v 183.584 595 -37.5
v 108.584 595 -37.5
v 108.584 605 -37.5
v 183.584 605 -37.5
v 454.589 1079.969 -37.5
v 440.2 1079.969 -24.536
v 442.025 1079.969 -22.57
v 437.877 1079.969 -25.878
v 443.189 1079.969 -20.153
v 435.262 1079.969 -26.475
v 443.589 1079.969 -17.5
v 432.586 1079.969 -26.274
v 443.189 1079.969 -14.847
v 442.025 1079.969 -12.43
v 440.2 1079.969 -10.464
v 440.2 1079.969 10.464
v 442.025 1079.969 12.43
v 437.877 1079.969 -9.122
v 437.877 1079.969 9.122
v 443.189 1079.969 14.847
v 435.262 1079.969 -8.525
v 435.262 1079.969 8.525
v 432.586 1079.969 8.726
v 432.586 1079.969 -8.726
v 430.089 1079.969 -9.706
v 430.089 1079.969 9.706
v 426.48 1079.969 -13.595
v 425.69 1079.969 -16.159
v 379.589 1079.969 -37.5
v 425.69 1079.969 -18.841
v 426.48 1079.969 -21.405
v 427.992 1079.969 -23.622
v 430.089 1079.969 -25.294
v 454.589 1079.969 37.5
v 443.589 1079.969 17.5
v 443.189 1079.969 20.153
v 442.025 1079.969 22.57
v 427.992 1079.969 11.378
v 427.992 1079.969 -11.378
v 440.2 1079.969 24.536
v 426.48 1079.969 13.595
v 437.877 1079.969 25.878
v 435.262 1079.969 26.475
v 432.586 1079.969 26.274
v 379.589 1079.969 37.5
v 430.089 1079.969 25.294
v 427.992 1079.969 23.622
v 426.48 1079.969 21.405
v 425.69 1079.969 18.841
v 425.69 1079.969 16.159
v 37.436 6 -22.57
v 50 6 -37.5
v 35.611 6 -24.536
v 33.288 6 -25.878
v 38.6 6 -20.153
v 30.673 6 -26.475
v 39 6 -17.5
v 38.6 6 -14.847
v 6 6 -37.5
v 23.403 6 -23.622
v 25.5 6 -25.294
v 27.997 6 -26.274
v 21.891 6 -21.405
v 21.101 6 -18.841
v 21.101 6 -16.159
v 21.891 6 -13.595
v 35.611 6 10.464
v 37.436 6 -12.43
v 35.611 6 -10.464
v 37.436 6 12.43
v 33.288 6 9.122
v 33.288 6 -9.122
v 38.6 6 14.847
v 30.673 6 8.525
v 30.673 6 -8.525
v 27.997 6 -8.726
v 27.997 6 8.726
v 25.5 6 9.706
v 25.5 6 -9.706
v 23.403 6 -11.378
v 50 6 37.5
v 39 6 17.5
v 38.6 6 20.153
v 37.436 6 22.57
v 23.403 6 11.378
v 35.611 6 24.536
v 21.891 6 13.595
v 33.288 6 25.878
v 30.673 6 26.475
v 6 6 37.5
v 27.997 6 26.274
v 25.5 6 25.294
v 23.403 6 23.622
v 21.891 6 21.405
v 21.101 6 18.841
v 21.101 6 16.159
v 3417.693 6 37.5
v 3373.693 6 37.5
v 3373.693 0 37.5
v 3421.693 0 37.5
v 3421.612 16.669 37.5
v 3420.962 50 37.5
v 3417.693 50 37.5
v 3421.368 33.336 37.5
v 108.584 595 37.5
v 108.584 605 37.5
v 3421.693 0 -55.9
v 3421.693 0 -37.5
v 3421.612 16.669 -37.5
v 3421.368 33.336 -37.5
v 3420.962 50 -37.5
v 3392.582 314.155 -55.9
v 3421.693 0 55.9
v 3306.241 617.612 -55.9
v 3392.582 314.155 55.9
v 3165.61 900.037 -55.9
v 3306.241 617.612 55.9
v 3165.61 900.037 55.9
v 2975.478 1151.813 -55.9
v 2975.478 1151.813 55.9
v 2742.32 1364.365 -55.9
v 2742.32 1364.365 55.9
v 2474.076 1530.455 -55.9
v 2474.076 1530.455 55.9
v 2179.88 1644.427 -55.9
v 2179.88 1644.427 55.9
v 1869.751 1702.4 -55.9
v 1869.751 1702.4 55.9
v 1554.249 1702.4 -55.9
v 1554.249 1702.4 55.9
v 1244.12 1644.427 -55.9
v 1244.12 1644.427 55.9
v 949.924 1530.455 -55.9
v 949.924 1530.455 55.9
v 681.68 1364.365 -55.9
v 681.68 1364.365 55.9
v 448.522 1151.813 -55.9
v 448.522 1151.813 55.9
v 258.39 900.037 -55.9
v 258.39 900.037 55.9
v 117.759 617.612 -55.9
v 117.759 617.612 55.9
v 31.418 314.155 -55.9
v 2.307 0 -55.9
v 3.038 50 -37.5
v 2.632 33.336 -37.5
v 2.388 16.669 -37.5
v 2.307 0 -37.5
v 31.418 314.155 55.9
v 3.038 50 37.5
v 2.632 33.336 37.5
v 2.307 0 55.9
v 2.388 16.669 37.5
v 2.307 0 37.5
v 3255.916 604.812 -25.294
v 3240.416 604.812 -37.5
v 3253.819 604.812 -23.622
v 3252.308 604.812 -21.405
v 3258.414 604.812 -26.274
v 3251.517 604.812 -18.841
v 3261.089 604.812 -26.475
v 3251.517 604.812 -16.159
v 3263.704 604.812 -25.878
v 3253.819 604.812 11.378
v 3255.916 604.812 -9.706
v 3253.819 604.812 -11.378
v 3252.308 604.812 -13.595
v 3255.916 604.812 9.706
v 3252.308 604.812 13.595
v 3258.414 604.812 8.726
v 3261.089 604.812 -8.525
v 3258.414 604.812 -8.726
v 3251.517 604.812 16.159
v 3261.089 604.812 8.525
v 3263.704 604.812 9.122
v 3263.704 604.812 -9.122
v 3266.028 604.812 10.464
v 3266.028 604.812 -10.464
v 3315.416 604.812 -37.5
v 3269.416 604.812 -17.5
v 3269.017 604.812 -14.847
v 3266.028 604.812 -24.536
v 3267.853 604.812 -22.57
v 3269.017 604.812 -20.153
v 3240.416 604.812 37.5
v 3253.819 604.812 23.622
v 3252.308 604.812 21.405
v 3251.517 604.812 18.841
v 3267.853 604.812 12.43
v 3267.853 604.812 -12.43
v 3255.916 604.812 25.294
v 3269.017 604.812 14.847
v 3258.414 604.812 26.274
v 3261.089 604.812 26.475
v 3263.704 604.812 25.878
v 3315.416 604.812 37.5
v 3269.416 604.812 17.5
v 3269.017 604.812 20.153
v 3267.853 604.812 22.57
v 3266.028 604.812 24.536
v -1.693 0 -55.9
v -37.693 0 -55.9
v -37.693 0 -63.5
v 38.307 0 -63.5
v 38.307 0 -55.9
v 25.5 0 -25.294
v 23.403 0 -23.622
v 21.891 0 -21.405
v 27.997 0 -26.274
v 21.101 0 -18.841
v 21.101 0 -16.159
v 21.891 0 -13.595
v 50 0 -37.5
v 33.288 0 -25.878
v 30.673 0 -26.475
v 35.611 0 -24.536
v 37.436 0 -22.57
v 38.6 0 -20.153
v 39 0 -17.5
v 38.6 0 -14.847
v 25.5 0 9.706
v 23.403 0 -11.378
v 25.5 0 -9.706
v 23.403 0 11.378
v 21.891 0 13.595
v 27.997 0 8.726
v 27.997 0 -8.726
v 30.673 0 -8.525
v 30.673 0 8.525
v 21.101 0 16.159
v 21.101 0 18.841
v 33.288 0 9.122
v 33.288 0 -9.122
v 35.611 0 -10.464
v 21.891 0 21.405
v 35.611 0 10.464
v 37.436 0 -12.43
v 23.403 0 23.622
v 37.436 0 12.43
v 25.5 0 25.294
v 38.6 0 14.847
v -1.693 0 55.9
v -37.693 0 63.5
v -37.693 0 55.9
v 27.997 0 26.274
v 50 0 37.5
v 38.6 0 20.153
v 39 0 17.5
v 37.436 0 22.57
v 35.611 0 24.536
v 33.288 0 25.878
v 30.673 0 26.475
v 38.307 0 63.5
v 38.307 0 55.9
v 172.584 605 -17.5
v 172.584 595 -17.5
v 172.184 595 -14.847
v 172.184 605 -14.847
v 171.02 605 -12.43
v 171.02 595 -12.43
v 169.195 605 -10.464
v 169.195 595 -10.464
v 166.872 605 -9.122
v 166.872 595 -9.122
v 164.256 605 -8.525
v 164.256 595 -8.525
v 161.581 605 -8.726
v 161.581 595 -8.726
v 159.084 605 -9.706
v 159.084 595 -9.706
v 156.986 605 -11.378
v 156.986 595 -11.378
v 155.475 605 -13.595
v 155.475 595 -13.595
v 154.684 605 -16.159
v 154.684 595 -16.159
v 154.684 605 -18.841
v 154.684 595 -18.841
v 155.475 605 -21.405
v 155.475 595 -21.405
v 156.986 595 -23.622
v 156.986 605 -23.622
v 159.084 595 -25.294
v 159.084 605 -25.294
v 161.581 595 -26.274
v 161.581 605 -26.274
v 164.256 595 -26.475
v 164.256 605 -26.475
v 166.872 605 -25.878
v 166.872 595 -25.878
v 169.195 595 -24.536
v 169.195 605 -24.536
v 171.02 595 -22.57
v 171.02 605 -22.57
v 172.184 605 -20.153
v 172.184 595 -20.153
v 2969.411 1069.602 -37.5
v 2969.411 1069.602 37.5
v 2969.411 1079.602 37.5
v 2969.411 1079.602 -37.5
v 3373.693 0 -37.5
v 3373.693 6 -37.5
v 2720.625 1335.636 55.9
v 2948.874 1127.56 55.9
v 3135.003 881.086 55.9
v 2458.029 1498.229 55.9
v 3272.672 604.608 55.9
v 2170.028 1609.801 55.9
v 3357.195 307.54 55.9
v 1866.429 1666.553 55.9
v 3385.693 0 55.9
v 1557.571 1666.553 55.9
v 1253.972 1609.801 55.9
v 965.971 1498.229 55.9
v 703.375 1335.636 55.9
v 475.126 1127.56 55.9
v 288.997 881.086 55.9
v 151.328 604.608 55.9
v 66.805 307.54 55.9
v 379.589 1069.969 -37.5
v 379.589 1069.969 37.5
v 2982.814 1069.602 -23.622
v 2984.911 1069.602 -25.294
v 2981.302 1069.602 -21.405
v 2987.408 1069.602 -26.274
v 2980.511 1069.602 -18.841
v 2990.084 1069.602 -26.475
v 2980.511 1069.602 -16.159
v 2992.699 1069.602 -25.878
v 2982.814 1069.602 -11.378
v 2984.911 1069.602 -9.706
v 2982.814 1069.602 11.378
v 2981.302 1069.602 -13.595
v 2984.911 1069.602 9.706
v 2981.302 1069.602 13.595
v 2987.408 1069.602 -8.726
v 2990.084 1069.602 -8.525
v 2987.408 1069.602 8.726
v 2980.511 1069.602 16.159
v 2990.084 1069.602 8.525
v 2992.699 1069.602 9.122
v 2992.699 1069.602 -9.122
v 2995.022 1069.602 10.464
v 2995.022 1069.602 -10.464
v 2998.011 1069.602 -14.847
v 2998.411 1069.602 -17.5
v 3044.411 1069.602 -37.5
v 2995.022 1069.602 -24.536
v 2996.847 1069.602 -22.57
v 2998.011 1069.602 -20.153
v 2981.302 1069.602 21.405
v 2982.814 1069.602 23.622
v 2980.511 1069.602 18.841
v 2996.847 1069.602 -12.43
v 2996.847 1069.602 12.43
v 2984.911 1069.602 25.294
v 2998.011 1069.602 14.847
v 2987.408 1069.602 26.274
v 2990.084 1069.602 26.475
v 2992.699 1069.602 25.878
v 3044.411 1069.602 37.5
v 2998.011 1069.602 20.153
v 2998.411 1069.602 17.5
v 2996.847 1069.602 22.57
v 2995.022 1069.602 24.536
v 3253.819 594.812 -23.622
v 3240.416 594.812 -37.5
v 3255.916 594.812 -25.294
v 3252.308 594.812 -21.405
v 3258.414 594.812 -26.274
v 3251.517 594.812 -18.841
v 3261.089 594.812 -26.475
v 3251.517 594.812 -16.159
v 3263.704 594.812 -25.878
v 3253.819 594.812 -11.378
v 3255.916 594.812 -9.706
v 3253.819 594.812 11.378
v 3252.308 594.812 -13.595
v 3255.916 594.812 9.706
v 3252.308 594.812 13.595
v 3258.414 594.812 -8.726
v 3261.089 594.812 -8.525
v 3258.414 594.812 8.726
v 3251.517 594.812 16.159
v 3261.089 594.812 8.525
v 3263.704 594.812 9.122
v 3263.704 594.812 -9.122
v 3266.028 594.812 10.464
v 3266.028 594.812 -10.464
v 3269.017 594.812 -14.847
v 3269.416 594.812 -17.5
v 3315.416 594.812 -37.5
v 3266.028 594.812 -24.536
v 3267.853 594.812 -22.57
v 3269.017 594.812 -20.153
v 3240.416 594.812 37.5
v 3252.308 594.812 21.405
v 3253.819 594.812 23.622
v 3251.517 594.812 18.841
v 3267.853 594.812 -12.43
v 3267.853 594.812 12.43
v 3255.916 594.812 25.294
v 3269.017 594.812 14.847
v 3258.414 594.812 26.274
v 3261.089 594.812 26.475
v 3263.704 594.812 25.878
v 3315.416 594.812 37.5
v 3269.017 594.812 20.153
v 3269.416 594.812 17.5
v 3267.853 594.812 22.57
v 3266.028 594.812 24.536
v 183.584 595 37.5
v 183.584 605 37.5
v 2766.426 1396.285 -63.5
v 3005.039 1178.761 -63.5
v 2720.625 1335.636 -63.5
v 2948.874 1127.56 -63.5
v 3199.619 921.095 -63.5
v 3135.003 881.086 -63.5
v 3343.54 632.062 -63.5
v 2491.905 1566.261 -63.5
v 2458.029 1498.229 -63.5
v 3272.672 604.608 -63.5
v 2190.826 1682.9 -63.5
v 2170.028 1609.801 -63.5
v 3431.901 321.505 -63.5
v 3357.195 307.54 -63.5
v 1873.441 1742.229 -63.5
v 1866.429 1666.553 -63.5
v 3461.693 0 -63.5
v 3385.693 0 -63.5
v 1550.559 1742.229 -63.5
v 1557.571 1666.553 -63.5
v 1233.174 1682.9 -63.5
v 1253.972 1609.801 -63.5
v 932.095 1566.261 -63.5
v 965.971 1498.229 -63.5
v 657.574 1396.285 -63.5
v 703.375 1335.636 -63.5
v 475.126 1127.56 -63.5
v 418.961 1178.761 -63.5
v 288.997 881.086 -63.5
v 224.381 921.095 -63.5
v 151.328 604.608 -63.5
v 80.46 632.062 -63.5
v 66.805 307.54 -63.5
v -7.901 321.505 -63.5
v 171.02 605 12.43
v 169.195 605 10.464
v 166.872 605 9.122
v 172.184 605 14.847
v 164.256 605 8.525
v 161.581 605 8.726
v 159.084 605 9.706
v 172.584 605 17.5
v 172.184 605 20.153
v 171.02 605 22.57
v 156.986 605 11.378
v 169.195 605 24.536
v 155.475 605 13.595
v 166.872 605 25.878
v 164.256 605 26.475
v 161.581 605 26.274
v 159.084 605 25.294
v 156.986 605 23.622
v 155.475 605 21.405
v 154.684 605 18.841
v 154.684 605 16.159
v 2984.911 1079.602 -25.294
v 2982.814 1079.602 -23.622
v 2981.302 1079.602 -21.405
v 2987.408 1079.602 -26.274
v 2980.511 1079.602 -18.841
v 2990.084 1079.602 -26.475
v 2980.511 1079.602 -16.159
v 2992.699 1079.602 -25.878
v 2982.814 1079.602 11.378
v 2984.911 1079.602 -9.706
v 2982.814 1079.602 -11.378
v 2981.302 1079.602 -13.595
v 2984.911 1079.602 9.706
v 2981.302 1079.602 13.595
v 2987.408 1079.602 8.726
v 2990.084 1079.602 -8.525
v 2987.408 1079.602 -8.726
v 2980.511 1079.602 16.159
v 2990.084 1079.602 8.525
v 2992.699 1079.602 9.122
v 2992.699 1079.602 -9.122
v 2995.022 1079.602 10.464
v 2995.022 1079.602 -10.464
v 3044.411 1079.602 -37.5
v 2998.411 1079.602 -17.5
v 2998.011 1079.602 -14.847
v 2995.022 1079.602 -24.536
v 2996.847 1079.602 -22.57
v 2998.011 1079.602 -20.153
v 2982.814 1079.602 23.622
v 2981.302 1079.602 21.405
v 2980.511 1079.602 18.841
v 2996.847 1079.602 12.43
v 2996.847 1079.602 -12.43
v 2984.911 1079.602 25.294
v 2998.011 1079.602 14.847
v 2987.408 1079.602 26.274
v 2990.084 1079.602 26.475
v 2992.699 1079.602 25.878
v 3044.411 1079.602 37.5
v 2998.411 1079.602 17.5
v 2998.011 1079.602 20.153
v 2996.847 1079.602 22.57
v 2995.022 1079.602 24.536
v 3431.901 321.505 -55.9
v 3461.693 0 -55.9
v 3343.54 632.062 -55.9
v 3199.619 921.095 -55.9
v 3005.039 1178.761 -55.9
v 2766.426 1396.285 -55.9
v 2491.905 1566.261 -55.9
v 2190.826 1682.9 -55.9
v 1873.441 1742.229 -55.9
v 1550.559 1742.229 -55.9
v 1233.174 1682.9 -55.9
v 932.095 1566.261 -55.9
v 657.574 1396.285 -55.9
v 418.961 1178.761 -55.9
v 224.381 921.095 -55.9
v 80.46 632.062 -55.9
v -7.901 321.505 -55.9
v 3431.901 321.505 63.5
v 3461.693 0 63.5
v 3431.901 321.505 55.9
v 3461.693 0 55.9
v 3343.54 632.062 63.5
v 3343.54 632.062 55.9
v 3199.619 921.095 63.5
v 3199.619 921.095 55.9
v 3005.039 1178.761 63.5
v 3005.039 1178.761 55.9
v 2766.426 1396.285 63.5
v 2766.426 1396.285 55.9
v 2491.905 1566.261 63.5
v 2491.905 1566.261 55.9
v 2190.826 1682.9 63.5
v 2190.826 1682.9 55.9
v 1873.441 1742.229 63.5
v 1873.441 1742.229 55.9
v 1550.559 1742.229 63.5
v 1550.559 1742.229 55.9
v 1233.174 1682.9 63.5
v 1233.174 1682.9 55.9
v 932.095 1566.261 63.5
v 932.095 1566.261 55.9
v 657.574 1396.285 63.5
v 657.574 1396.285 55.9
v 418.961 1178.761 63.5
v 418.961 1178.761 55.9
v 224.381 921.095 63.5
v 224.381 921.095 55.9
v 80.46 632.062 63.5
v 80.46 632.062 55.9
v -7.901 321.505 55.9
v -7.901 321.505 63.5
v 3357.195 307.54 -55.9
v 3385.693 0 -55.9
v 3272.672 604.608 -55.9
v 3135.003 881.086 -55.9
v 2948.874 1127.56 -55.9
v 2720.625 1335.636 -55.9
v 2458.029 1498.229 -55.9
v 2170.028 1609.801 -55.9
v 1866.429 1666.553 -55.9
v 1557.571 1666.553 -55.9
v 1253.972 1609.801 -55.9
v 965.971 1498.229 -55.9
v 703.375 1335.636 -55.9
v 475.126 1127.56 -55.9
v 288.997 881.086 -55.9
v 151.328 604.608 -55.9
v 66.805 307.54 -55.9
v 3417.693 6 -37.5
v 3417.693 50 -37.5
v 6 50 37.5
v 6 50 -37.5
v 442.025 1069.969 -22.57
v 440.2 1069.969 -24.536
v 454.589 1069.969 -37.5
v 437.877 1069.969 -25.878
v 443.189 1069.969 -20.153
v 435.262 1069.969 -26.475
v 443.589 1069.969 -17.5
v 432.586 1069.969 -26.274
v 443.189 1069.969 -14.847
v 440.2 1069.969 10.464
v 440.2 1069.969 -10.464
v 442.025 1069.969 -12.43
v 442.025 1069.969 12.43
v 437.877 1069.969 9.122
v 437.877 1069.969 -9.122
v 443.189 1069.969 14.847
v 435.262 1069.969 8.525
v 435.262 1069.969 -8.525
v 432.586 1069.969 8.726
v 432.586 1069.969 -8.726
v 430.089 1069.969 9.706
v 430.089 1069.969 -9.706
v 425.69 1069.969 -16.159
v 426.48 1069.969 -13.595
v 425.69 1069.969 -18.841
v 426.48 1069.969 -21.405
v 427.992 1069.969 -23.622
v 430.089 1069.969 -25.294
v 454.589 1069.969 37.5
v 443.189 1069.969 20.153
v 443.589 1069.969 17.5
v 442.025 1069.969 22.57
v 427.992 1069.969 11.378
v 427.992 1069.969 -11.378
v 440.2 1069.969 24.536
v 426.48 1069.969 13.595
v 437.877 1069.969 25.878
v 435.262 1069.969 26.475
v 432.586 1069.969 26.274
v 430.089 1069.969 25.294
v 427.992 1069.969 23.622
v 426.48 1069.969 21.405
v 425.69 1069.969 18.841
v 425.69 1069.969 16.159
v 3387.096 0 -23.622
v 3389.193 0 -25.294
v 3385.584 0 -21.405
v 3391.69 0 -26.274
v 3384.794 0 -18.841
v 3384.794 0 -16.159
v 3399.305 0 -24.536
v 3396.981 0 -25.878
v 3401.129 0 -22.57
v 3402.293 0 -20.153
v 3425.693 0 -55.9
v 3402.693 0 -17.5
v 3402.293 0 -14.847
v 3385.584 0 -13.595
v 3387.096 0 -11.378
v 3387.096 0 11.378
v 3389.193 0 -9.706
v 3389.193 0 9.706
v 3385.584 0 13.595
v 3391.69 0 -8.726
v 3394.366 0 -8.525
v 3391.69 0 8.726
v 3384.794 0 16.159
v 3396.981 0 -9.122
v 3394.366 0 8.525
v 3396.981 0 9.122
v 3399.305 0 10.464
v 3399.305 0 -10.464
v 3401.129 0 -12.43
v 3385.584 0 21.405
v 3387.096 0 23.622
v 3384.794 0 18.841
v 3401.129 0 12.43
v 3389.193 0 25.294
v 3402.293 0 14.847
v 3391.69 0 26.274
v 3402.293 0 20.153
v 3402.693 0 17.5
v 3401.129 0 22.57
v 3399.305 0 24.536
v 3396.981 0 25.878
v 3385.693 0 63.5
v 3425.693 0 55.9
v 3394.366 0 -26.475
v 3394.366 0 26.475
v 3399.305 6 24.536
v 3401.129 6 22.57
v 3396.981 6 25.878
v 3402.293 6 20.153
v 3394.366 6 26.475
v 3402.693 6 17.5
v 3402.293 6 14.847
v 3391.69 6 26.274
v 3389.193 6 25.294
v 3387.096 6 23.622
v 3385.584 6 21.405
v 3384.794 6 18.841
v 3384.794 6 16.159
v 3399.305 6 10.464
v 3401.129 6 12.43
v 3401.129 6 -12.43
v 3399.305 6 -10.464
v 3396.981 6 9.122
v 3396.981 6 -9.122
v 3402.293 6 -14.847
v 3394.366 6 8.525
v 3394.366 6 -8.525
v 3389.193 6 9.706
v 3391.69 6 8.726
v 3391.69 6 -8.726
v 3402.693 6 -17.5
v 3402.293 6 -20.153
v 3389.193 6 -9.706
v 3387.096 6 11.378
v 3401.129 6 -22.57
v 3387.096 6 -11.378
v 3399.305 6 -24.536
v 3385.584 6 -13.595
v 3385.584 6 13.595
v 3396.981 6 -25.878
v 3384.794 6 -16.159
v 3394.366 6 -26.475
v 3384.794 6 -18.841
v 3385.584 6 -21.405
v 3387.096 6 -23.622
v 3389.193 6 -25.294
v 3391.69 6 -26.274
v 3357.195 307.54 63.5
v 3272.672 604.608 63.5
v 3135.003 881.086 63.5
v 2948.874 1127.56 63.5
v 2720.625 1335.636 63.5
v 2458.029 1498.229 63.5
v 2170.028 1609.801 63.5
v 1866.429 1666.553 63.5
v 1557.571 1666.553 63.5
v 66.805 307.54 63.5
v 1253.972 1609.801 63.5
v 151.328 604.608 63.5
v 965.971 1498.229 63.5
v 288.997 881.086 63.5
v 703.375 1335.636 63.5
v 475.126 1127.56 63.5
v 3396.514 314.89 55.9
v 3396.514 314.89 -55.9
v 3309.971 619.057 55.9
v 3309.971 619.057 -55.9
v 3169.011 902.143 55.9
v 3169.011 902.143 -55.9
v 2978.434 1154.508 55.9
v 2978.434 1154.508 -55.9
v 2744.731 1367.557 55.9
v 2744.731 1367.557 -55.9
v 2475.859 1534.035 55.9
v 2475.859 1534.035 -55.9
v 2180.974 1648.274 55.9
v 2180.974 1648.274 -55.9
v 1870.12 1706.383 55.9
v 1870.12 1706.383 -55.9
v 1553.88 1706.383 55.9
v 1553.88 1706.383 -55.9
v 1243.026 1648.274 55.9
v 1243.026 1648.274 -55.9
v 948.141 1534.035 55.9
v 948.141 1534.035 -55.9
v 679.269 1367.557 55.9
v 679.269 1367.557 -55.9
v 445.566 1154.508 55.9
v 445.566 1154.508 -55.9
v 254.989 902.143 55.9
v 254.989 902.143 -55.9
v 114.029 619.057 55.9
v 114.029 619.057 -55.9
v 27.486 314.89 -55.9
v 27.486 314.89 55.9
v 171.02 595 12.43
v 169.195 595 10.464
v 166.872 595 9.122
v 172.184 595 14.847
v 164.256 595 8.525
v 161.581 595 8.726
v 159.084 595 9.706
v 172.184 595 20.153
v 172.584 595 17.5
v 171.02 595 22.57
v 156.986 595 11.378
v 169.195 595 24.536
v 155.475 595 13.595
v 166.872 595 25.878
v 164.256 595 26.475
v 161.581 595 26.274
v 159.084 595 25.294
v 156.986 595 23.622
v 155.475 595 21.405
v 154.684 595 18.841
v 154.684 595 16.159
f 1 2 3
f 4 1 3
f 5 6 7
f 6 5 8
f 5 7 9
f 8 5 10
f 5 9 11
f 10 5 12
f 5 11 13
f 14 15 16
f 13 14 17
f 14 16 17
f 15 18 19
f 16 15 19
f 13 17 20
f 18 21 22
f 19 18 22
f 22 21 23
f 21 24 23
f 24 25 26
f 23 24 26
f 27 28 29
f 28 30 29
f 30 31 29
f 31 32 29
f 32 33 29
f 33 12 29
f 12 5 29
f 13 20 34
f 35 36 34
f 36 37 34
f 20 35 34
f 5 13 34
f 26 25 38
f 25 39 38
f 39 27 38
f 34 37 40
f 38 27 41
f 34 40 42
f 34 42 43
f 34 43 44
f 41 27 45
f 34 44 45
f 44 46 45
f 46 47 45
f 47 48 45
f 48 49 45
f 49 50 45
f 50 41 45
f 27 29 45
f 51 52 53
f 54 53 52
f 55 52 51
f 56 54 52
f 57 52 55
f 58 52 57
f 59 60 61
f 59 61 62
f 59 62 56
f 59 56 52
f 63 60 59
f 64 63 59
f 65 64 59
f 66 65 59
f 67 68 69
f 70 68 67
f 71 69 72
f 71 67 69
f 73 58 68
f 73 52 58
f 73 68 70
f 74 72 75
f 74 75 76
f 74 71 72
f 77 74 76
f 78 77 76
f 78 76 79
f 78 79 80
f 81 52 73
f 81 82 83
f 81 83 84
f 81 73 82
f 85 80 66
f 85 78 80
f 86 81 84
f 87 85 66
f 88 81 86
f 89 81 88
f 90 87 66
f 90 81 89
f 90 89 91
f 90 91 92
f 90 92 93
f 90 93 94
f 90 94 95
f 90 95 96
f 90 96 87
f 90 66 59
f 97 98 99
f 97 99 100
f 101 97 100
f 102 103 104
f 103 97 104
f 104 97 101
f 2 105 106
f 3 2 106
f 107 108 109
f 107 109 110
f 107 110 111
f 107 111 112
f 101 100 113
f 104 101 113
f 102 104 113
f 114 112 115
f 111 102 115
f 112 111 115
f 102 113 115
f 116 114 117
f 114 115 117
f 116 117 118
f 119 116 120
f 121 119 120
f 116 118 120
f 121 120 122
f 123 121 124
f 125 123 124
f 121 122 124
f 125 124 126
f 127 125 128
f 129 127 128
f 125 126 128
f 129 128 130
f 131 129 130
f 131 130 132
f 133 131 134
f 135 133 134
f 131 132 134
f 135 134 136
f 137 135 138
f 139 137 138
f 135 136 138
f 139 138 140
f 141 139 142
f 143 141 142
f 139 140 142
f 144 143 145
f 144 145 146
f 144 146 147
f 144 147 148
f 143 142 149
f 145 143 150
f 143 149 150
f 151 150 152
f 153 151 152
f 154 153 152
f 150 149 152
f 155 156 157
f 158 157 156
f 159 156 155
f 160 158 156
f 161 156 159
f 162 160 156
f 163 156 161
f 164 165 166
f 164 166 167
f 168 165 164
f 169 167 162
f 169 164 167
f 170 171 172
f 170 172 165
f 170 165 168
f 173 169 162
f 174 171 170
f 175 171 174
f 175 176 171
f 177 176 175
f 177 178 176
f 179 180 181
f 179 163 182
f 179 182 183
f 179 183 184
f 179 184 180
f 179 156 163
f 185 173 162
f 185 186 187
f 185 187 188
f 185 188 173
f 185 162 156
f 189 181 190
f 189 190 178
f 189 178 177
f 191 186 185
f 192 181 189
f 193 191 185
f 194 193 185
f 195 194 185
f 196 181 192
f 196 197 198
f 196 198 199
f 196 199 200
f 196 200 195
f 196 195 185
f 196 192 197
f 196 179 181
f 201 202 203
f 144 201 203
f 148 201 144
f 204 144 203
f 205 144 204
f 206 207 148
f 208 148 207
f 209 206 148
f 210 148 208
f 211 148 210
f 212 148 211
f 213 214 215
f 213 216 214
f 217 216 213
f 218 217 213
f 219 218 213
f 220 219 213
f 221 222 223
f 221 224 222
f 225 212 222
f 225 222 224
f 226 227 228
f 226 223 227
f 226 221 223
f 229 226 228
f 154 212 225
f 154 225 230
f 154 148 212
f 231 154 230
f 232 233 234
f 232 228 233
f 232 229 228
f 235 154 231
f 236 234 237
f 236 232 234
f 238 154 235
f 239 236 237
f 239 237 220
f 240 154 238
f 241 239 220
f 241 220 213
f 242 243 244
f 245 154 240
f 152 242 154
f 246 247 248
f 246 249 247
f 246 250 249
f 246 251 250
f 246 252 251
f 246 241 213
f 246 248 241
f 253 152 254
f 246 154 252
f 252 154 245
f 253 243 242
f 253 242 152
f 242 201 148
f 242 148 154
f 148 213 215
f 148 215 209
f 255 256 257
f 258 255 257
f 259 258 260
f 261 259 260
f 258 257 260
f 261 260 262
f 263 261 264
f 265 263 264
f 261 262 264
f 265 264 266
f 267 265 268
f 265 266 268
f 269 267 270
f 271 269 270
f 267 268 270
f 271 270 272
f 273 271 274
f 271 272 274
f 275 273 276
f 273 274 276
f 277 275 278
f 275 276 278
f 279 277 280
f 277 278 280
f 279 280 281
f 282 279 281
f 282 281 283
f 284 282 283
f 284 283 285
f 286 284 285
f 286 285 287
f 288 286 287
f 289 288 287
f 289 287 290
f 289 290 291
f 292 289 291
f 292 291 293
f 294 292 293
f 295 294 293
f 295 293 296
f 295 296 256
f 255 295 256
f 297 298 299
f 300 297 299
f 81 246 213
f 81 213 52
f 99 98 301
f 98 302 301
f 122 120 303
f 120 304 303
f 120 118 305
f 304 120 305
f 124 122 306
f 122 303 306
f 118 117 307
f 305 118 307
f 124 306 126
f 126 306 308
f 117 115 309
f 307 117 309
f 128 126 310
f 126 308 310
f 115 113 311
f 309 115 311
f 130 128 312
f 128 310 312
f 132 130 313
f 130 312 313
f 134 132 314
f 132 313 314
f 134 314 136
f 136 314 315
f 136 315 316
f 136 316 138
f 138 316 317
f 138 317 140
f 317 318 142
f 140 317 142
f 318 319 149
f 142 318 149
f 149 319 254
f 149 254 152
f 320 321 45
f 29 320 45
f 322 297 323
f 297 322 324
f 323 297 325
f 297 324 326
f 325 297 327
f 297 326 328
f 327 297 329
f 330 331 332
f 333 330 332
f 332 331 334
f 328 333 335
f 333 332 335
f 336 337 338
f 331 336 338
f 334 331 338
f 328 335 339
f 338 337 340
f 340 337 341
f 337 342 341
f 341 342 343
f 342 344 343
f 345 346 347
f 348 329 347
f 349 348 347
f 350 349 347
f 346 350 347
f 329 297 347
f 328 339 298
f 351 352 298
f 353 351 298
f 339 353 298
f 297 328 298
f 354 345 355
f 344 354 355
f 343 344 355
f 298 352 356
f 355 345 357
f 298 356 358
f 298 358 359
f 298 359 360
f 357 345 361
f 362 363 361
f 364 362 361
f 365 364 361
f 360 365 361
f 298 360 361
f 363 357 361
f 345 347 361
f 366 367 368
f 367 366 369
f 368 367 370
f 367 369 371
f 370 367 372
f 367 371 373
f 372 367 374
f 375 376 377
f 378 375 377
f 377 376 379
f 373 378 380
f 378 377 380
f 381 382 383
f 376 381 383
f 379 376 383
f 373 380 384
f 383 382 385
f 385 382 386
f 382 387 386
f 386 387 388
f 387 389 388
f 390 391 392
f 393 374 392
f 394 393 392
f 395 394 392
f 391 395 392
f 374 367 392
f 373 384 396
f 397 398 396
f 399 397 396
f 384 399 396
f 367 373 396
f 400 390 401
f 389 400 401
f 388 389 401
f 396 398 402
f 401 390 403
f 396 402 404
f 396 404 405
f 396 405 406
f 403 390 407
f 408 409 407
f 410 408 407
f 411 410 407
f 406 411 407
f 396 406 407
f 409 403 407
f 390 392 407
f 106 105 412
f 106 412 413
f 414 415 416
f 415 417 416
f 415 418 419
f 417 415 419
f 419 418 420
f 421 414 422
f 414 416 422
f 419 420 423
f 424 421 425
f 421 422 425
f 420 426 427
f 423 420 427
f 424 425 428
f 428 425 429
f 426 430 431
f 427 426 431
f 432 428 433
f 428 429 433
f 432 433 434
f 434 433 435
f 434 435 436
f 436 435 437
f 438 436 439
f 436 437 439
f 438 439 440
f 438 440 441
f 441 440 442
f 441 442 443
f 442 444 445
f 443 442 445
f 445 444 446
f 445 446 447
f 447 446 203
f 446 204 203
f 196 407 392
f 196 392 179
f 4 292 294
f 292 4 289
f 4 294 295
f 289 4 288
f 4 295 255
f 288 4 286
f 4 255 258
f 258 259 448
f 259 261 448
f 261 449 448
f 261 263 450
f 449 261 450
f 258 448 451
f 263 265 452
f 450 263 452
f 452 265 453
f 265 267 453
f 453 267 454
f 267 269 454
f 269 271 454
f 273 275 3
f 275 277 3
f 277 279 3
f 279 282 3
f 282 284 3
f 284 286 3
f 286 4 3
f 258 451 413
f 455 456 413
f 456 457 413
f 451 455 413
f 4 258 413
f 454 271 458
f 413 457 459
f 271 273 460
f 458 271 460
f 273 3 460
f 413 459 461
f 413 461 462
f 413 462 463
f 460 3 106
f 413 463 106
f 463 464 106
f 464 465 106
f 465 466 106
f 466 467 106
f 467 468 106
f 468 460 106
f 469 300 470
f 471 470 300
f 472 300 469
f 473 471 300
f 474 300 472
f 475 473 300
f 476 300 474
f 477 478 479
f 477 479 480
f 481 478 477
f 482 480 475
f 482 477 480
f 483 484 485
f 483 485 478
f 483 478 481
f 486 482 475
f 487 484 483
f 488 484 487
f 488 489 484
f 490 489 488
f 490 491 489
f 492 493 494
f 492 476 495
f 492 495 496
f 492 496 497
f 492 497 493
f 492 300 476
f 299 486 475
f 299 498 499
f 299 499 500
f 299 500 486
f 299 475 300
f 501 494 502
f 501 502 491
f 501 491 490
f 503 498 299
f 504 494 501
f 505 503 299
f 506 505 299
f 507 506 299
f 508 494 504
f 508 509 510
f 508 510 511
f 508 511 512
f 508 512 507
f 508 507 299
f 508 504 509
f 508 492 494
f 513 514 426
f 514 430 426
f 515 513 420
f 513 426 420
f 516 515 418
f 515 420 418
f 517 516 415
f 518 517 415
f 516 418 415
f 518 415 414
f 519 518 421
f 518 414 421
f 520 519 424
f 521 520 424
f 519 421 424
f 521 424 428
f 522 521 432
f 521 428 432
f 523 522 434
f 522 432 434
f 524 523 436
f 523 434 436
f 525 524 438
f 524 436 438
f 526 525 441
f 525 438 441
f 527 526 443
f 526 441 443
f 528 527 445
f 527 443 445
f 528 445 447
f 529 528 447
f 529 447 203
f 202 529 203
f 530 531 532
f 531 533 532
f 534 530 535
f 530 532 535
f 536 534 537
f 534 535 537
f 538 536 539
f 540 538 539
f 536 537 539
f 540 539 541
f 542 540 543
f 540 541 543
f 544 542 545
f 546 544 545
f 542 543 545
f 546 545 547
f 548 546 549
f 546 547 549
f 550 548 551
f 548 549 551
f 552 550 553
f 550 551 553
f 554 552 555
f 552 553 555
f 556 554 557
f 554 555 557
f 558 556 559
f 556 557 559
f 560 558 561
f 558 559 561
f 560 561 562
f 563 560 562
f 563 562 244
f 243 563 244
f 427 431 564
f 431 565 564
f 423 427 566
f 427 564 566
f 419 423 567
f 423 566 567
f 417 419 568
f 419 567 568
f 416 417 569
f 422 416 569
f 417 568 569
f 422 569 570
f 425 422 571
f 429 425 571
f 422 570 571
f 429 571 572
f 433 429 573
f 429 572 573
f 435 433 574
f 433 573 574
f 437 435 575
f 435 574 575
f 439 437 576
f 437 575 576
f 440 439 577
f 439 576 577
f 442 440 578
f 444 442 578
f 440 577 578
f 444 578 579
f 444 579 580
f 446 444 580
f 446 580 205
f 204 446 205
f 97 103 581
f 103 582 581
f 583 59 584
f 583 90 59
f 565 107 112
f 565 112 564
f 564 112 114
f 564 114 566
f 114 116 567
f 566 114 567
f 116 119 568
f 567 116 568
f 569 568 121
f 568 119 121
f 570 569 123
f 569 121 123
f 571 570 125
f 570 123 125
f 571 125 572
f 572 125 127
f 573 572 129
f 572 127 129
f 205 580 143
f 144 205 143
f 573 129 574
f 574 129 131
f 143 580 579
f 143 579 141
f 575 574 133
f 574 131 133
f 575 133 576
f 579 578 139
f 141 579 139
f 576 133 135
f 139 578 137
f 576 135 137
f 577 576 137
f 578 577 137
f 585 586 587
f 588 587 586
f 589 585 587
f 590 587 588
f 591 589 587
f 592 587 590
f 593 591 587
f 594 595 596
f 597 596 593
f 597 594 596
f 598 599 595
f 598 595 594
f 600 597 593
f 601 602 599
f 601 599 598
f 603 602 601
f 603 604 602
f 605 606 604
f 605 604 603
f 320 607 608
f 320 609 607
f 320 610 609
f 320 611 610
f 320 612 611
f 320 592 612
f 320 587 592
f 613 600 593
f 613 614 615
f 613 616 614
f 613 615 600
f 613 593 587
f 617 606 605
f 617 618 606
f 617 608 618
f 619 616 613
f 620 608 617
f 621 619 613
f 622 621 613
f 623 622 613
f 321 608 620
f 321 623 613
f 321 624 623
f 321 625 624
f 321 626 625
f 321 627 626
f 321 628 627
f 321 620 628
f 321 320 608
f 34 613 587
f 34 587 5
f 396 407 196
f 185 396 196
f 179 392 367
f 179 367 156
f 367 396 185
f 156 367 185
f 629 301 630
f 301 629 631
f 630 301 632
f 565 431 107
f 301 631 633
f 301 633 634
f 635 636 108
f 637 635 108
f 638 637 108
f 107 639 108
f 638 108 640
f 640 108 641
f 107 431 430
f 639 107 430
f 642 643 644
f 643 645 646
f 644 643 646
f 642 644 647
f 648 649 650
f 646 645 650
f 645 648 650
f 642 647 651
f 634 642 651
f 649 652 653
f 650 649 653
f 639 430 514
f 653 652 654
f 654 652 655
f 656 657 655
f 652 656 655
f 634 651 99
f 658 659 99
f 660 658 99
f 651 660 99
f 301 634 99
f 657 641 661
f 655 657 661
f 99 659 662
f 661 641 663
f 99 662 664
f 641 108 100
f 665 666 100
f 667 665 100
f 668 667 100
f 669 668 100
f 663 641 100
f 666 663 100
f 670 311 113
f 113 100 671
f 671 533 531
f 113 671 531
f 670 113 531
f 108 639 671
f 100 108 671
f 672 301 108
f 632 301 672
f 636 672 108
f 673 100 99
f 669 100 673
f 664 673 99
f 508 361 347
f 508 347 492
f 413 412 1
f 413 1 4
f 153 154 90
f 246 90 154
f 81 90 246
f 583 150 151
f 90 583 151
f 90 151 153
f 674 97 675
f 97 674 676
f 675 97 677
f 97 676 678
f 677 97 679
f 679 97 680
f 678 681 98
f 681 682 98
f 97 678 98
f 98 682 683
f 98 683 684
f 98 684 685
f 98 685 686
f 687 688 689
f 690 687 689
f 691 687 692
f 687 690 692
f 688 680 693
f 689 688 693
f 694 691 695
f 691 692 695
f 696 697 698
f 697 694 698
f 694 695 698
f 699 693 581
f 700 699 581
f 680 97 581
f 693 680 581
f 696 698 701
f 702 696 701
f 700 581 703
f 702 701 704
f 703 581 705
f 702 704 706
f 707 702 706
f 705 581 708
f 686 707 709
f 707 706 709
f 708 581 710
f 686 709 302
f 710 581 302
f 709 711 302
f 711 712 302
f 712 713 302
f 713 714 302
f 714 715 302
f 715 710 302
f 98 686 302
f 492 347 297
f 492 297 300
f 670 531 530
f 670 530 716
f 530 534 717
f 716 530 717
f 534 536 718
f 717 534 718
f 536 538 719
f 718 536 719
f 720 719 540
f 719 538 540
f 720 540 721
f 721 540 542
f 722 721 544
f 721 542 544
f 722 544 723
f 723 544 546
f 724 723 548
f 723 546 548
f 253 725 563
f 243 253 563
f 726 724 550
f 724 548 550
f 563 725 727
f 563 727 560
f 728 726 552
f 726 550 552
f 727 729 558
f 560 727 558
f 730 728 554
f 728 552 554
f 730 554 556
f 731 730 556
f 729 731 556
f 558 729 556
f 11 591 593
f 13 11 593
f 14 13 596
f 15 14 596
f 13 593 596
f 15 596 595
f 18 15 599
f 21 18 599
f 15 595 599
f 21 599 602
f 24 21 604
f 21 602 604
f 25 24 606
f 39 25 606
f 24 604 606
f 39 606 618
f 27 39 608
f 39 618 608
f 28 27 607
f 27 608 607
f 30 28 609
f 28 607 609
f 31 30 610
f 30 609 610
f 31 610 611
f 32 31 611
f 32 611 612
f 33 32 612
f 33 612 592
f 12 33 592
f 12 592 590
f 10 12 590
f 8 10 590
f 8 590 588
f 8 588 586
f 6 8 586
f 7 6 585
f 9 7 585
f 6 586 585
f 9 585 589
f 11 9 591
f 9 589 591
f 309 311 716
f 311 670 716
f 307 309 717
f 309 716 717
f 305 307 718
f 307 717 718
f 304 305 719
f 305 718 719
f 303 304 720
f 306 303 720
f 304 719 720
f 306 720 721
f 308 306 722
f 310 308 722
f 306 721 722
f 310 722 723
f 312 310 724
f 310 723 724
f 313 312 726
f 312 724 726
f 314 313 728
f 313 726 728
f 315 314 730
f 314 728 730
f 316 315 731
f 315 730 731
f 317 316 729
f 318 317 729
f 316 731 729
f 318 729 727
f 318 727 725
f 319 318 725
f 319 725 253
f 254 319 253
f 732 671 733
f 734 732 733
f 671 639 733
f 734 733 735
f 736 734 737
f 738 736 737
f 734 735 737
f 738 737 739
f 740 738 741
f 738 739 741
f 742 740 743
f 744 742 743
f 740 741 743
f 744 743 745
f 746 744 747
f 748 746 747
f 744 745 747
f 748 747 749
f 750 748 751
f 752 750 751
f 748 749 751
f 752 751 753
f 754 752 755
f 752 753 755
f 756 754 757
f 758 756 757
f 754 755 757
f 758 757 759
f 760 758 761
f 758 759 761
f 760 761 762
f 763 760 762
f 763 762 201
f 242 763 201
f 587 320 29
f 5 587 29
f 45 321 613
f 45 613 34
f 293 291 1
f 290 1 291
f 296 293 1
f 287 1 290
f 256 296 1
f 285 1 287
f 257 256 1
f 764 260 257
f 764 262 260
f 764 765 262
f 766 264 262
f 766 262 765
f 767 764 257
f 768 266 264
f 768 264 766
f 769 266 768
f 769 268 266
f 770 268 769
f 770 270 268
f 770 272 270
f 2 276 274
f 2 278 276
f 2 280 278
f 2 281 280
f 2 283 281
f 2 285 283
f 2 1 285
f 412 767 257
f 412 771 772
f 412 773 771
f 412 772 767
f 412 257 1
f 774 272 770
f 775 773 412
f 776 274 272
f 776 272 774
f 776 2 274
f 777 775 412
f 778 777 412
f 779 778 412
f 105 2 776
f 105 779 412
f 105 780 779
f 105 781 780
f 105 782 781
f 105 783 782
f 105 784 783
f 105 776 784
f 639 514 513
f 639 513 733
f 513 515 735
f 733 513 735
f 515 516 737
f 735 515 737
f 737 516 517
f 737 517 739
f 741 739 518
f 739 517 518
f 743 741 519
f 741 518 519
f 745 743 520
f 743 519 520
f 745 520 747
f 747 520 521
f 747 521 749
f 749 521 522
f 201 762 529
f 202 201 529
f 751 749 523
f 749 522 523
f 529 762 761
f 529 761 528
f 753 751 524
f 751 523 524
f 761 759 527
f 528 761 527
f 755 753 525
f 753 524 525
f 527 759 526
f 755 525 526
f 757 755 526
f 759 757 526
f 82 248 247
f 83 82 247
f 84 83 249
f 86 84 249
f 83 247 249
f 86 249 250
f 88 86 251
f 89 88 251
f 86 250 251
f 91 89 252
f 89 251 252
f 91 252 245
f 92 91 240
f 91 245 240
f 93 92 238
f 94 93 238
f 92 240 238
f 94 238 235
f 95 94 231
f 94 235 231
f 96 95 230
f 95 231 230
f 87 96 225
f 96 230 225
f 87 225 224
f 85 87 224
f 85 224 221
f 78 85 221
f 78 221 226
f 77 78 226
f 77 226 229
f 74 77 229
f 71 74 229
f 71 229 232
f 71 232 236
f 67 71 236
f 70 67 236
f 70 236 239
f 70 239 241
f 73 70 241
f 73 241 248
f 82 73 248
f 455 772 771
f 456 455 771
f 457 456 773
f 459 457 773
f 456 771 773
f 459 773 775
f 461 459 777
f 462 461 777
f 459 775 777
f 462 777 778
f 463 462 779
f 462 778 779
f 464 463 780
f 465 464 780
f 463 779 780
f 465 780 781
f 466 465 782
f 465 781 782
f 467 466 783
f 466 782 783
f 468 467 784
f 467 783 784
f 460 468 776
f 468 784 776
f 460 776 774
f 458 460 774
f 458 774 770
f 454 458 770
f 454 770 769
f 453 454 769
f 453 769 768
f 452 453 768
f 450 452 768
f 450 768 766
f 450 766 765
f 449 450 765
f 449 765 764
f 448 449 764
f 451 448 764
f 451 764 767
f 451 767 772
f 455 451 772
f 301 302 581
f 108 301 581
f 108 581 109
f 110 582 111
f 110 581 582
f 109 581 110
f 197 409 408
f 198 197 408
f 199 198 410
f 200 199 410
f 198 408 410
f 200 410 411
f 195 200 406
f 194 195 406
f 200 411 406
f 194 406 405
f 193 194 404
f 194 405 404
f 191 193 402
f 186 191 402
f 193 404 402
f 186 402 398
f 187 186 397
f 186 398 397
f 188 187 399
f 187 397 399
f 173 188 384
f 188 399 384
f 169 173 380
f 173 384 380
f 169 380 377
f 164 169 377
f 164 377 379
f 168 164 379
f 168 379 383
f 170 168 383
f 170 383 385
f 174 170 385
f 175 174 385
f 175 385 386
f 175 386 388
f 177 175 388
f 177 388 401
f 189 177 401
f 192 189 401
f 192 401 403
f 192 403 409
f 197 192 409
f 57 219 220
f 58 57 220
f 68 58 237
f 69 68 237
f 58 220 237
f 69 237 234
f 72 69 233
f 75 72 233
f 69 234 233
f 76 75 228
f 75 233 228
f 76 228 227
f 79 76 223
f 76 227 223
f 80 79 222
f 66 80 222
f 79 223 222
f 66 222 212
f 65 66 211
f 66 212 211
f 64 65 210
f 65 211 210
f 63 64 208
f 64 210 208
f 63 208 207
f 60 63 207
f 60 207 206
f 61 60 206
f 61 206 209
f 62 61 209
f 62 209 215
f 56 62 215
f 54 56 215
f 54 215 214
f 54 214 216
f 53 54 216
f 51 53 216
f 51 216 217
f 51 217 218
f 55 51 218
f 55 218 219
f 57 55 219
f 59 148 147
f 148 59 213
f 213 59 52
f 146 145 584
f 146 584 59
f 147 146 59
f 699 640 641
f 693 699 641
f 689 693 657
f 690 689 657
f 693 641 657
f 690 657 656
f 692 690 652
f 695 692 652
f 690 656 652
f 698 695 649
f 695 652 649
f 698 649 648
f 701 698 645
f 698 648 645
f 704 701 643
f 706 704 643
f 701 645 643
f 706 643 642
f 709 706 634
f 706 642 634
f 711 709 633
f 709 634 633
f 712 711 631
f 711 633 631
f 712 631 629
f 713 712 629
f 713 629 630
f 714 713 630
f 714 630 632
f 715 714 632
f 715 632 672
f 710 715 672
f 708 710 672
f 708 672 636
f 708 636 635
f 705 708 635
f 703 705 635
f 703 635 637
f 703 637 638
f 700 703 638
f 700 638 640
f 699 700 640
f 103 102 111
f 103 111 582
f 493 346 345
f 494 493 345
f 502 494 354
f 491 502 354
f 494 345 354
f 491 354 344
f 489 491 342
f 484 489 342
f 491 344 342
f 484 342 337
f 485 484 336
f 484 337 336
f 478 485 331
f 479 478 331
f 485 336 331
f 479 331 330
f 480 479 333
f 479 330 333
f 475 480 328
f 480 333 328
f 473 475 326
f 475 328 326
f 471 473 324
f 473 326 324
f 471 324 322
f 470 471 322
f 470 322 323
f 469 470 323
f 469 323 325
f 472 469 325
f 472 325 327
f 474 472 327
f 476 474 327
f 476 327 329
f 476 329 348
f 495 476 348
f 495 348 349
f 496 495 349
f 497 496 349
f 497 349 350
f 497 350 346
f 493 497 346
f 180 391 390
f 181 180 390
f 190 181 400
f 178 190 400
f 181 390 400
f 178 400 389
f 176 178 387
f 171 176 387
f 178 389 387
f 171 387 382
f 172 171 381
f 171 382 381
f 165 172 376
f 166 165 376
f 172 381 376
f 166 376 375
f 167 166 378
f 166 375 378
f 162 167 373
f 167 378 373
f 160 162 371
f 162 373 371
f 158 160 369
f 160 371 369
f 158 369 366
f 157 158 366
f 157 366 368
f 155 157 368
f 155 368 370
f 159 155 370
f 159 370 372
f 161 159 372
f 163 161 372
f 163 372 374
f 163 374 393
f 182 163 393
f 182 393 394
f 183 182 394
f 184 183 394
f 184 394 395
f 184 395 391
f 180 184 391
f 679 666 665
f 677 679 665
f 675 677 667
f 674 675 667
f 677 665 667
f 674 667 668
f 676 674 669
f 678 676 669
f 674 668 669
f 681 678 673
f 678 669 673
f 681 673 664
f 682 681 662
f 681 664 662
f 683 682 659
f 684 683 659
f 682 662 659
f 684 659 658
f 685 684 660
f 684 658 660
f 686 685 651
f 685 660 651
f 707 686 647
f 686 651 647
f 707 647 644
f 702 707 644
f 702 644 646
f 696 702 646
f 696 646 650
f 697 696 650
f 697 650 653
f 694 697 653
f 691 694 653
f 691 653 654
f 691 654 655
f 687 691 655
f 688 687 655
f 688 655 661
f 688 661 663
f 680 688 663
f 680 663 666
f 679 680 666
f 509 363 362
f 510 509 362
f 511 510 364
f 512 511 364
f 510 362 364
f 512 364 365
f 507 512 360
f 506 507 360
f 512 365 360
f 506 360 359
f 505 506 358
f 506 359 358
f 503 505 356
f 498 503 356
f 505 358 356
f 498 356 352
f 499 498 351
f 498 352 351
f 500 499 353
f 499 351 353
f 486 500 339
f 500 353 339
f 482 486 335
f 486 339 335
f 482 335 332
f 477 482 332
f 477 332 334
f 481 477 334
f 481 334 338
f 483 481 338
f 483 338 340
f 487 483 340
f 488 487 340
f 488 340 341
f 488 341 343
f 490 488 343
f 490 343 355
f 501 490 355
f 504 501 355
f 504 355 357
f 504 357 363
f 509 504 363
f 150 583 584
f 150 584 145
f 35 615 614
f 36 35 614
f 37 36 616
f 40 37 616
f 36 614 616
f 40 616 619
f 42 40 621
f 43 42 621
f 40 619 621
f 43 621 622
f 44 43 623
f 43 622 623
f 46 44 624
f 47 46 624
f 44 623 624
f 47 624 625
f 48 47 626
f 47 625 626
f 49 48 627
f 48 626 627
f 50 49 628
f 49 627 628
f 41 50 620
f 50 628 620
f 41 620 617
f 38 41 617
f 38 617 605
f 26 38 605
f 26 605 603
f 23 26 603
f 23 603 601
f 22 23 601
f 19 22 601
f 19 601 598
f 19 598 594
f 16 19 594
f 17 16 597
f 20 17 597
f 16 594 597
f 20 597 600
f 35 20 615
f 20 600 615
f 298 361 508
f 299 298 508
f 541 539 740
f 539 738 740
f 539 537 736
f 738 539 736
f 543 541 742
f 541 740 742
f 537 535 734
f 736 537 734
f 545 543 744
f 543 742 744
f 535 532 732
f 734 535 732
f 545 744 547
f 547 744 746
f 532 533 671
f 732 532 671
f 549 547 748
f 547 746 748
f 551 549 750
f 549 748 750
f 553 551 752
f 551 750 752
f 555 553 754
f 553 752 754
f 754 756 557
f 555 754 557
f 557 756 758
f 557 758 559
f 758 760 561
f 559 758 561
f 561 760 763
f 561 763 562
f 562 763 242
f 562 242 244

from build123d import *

# Parameters (mm, degrees)
F5_W      = 10
F5_H      = 75
F6_DEPTH  = 75
F9_W      = 10
F9_H      = 75
F10_DEPTH = 75
F11_W     = 10
F11_H     = 75
F12_DEPTH = 75
F13_W     = 10
F13_H     = 75
F14_DEPTH = 75
F15_R     = 9
F16_DEPTH = 10
F17_R     = 9
F18_DEPTH = 25
F19_R     = 9
F20_DEPTH = 25
F21_R     = 9
F22_DEPTH = 25
F24_DEPTH = 37.5
F25_R     = 9
F26_DEPTH = 25


with BuildPart() as f2:
    # F2: sweep along a path in F1
    with BuildLine(Plane.XY) as f2_path:
        ThreePointArc((3424, 0), (1712, 1712), (0, 0))
    # F0 (on Front) → F2 (sweep)
    with BuildSketch(Plane.XZ):
        Polygon((38.306882, 63.5), (-37.693118, 63.5), (-37.693118, 55.9), (-1.693118, 55.9), (-1.693118, -55.9), (-37.693118, -55.9), (-37.693118, -63.5), (38.306882, -63.5), (38.306882, -55.9), (2.306882, -55.9), (2.306882, 55.9), (38.306882, 55.9), align=None)
    sweep(path=f2_path.line)

    # F23 (on Top) → F24 (join, symmetric)
    with BuildSketch(Plane.XY):
        Polygon((3423.693118, 6), (3423.693118, 50), (3417.693118, 50), (3417.693118, 6), (3373.693118, 6), (3373.693118, 0), (3417.693118, 0), (3423.693118, 0), align=None)
        Polygon((6, 50), (0, 50), (0, 0), (6, 0), (50, 0), (50, 6), (6, 6), align=None)
    extrude(amount=F24_DEPTH, both=True)

    # F25 (on Front) → F26 (cut)
    with BuildSketch(Plane.XZ):
        with Locations((30, 17.5)):
            Circle(F25_R)
        with Locations((30, -17.5)):
            Circle(F25_R)
        with Locations((3393.693118, 17.5)):
            Circle(F25_R)
        with Locations((3393.693118, -17.5)):
            Circle(F25_R)
    extrude(amount=-F26_DEPTH, mode=Mode.SUBTRACT)


with BuildPart() as f6:
    # F5 (on face) → F6 (new body)
    with BuildSketch(Plane.YZ.offset(3044.410973)):
        with Locations((1074.601544, 0)):
            Rectangle(F5_W, F5_H)
    extrude(amount=-F6_DEPTH)

    # F21 (on face) → F22 (cut)
    with BuildSketch(Plane.XZ.offset(-1069.601544)):
        with Locations((2989.410973, 17.5)):
            Circle(F21_R)
        with Locations((2989.410973, -17.5)):
            Circle(F21_R)
    extrude(amount=-F22_DEPTH, mode=Mode.SUBTRACT)


with BuildPart() as f10:
    # F9 (on face) → F10 (new body)
    with BuildSketch(Plane.YZ.offset(108.583647)):
        with Locations((600, 0)):
            Rectangle(F9_W, F9_H)
    extrude(amount=F10_DEPTH)

    # F17 (on face) → F18 (cut)
    with BuildSketch(Plane.XZ.offset(-595)):
        with Locations((163.583647, 17.5)):
            Circle(F17_R)
        with Locations((163.583647, -17.5)):
            Circle(F17_R)
    extrude(amount=-F18_DEPTH, mode=Mode.SUBTRACT)


with BuildPart() as f12:
    # F11 (on face) → F12 (new body)
    with BuildSketch(Plane.YZ.offset(3315.416353)):
        with Locations((599.81208, 0)):
            Rectangle(F11_W, F11_H)
    extrude(amount=-F12_DEPTH)

    # F19 (on face) → F20 (cut)
    with BuildSketch(Plane.XZ.offset(-594.81208)):
        with Locations((3260.416353, 17.5)):
            Circle(F19_R)
        with Locations((3260.416353, -17.5)):
            Circle(F19_R)
    extrude(amount=-F20_DEPTH, mode=Mode.SUBTRACT)


with BuildPart() as f14:
    # F13 (on face) → F14 (new body)
    with BuildSketch(Plane.YZ.offset(379.589027)):
        with Locations((1074.968755, 0)):
            Rectangle(F13_W, F13_H)
    extrude(amount=F14_DEPTH)

    # F15 (on face) → F16 (cut)
    with BuildSketch(Plane.XZ.offset(-1069.968755)):
        with Locations((434.589027, 17.5)):
            Circle(F15_R)
        with Locations((434.589027, -17.5)):
            Circle(F15_R)
    extrude(amount=-F16_DEPTH, mode=Mode.SUBTRACT)


solid = Compound([f2.part, f6.part, f10.part, f12.part, f14.part])
